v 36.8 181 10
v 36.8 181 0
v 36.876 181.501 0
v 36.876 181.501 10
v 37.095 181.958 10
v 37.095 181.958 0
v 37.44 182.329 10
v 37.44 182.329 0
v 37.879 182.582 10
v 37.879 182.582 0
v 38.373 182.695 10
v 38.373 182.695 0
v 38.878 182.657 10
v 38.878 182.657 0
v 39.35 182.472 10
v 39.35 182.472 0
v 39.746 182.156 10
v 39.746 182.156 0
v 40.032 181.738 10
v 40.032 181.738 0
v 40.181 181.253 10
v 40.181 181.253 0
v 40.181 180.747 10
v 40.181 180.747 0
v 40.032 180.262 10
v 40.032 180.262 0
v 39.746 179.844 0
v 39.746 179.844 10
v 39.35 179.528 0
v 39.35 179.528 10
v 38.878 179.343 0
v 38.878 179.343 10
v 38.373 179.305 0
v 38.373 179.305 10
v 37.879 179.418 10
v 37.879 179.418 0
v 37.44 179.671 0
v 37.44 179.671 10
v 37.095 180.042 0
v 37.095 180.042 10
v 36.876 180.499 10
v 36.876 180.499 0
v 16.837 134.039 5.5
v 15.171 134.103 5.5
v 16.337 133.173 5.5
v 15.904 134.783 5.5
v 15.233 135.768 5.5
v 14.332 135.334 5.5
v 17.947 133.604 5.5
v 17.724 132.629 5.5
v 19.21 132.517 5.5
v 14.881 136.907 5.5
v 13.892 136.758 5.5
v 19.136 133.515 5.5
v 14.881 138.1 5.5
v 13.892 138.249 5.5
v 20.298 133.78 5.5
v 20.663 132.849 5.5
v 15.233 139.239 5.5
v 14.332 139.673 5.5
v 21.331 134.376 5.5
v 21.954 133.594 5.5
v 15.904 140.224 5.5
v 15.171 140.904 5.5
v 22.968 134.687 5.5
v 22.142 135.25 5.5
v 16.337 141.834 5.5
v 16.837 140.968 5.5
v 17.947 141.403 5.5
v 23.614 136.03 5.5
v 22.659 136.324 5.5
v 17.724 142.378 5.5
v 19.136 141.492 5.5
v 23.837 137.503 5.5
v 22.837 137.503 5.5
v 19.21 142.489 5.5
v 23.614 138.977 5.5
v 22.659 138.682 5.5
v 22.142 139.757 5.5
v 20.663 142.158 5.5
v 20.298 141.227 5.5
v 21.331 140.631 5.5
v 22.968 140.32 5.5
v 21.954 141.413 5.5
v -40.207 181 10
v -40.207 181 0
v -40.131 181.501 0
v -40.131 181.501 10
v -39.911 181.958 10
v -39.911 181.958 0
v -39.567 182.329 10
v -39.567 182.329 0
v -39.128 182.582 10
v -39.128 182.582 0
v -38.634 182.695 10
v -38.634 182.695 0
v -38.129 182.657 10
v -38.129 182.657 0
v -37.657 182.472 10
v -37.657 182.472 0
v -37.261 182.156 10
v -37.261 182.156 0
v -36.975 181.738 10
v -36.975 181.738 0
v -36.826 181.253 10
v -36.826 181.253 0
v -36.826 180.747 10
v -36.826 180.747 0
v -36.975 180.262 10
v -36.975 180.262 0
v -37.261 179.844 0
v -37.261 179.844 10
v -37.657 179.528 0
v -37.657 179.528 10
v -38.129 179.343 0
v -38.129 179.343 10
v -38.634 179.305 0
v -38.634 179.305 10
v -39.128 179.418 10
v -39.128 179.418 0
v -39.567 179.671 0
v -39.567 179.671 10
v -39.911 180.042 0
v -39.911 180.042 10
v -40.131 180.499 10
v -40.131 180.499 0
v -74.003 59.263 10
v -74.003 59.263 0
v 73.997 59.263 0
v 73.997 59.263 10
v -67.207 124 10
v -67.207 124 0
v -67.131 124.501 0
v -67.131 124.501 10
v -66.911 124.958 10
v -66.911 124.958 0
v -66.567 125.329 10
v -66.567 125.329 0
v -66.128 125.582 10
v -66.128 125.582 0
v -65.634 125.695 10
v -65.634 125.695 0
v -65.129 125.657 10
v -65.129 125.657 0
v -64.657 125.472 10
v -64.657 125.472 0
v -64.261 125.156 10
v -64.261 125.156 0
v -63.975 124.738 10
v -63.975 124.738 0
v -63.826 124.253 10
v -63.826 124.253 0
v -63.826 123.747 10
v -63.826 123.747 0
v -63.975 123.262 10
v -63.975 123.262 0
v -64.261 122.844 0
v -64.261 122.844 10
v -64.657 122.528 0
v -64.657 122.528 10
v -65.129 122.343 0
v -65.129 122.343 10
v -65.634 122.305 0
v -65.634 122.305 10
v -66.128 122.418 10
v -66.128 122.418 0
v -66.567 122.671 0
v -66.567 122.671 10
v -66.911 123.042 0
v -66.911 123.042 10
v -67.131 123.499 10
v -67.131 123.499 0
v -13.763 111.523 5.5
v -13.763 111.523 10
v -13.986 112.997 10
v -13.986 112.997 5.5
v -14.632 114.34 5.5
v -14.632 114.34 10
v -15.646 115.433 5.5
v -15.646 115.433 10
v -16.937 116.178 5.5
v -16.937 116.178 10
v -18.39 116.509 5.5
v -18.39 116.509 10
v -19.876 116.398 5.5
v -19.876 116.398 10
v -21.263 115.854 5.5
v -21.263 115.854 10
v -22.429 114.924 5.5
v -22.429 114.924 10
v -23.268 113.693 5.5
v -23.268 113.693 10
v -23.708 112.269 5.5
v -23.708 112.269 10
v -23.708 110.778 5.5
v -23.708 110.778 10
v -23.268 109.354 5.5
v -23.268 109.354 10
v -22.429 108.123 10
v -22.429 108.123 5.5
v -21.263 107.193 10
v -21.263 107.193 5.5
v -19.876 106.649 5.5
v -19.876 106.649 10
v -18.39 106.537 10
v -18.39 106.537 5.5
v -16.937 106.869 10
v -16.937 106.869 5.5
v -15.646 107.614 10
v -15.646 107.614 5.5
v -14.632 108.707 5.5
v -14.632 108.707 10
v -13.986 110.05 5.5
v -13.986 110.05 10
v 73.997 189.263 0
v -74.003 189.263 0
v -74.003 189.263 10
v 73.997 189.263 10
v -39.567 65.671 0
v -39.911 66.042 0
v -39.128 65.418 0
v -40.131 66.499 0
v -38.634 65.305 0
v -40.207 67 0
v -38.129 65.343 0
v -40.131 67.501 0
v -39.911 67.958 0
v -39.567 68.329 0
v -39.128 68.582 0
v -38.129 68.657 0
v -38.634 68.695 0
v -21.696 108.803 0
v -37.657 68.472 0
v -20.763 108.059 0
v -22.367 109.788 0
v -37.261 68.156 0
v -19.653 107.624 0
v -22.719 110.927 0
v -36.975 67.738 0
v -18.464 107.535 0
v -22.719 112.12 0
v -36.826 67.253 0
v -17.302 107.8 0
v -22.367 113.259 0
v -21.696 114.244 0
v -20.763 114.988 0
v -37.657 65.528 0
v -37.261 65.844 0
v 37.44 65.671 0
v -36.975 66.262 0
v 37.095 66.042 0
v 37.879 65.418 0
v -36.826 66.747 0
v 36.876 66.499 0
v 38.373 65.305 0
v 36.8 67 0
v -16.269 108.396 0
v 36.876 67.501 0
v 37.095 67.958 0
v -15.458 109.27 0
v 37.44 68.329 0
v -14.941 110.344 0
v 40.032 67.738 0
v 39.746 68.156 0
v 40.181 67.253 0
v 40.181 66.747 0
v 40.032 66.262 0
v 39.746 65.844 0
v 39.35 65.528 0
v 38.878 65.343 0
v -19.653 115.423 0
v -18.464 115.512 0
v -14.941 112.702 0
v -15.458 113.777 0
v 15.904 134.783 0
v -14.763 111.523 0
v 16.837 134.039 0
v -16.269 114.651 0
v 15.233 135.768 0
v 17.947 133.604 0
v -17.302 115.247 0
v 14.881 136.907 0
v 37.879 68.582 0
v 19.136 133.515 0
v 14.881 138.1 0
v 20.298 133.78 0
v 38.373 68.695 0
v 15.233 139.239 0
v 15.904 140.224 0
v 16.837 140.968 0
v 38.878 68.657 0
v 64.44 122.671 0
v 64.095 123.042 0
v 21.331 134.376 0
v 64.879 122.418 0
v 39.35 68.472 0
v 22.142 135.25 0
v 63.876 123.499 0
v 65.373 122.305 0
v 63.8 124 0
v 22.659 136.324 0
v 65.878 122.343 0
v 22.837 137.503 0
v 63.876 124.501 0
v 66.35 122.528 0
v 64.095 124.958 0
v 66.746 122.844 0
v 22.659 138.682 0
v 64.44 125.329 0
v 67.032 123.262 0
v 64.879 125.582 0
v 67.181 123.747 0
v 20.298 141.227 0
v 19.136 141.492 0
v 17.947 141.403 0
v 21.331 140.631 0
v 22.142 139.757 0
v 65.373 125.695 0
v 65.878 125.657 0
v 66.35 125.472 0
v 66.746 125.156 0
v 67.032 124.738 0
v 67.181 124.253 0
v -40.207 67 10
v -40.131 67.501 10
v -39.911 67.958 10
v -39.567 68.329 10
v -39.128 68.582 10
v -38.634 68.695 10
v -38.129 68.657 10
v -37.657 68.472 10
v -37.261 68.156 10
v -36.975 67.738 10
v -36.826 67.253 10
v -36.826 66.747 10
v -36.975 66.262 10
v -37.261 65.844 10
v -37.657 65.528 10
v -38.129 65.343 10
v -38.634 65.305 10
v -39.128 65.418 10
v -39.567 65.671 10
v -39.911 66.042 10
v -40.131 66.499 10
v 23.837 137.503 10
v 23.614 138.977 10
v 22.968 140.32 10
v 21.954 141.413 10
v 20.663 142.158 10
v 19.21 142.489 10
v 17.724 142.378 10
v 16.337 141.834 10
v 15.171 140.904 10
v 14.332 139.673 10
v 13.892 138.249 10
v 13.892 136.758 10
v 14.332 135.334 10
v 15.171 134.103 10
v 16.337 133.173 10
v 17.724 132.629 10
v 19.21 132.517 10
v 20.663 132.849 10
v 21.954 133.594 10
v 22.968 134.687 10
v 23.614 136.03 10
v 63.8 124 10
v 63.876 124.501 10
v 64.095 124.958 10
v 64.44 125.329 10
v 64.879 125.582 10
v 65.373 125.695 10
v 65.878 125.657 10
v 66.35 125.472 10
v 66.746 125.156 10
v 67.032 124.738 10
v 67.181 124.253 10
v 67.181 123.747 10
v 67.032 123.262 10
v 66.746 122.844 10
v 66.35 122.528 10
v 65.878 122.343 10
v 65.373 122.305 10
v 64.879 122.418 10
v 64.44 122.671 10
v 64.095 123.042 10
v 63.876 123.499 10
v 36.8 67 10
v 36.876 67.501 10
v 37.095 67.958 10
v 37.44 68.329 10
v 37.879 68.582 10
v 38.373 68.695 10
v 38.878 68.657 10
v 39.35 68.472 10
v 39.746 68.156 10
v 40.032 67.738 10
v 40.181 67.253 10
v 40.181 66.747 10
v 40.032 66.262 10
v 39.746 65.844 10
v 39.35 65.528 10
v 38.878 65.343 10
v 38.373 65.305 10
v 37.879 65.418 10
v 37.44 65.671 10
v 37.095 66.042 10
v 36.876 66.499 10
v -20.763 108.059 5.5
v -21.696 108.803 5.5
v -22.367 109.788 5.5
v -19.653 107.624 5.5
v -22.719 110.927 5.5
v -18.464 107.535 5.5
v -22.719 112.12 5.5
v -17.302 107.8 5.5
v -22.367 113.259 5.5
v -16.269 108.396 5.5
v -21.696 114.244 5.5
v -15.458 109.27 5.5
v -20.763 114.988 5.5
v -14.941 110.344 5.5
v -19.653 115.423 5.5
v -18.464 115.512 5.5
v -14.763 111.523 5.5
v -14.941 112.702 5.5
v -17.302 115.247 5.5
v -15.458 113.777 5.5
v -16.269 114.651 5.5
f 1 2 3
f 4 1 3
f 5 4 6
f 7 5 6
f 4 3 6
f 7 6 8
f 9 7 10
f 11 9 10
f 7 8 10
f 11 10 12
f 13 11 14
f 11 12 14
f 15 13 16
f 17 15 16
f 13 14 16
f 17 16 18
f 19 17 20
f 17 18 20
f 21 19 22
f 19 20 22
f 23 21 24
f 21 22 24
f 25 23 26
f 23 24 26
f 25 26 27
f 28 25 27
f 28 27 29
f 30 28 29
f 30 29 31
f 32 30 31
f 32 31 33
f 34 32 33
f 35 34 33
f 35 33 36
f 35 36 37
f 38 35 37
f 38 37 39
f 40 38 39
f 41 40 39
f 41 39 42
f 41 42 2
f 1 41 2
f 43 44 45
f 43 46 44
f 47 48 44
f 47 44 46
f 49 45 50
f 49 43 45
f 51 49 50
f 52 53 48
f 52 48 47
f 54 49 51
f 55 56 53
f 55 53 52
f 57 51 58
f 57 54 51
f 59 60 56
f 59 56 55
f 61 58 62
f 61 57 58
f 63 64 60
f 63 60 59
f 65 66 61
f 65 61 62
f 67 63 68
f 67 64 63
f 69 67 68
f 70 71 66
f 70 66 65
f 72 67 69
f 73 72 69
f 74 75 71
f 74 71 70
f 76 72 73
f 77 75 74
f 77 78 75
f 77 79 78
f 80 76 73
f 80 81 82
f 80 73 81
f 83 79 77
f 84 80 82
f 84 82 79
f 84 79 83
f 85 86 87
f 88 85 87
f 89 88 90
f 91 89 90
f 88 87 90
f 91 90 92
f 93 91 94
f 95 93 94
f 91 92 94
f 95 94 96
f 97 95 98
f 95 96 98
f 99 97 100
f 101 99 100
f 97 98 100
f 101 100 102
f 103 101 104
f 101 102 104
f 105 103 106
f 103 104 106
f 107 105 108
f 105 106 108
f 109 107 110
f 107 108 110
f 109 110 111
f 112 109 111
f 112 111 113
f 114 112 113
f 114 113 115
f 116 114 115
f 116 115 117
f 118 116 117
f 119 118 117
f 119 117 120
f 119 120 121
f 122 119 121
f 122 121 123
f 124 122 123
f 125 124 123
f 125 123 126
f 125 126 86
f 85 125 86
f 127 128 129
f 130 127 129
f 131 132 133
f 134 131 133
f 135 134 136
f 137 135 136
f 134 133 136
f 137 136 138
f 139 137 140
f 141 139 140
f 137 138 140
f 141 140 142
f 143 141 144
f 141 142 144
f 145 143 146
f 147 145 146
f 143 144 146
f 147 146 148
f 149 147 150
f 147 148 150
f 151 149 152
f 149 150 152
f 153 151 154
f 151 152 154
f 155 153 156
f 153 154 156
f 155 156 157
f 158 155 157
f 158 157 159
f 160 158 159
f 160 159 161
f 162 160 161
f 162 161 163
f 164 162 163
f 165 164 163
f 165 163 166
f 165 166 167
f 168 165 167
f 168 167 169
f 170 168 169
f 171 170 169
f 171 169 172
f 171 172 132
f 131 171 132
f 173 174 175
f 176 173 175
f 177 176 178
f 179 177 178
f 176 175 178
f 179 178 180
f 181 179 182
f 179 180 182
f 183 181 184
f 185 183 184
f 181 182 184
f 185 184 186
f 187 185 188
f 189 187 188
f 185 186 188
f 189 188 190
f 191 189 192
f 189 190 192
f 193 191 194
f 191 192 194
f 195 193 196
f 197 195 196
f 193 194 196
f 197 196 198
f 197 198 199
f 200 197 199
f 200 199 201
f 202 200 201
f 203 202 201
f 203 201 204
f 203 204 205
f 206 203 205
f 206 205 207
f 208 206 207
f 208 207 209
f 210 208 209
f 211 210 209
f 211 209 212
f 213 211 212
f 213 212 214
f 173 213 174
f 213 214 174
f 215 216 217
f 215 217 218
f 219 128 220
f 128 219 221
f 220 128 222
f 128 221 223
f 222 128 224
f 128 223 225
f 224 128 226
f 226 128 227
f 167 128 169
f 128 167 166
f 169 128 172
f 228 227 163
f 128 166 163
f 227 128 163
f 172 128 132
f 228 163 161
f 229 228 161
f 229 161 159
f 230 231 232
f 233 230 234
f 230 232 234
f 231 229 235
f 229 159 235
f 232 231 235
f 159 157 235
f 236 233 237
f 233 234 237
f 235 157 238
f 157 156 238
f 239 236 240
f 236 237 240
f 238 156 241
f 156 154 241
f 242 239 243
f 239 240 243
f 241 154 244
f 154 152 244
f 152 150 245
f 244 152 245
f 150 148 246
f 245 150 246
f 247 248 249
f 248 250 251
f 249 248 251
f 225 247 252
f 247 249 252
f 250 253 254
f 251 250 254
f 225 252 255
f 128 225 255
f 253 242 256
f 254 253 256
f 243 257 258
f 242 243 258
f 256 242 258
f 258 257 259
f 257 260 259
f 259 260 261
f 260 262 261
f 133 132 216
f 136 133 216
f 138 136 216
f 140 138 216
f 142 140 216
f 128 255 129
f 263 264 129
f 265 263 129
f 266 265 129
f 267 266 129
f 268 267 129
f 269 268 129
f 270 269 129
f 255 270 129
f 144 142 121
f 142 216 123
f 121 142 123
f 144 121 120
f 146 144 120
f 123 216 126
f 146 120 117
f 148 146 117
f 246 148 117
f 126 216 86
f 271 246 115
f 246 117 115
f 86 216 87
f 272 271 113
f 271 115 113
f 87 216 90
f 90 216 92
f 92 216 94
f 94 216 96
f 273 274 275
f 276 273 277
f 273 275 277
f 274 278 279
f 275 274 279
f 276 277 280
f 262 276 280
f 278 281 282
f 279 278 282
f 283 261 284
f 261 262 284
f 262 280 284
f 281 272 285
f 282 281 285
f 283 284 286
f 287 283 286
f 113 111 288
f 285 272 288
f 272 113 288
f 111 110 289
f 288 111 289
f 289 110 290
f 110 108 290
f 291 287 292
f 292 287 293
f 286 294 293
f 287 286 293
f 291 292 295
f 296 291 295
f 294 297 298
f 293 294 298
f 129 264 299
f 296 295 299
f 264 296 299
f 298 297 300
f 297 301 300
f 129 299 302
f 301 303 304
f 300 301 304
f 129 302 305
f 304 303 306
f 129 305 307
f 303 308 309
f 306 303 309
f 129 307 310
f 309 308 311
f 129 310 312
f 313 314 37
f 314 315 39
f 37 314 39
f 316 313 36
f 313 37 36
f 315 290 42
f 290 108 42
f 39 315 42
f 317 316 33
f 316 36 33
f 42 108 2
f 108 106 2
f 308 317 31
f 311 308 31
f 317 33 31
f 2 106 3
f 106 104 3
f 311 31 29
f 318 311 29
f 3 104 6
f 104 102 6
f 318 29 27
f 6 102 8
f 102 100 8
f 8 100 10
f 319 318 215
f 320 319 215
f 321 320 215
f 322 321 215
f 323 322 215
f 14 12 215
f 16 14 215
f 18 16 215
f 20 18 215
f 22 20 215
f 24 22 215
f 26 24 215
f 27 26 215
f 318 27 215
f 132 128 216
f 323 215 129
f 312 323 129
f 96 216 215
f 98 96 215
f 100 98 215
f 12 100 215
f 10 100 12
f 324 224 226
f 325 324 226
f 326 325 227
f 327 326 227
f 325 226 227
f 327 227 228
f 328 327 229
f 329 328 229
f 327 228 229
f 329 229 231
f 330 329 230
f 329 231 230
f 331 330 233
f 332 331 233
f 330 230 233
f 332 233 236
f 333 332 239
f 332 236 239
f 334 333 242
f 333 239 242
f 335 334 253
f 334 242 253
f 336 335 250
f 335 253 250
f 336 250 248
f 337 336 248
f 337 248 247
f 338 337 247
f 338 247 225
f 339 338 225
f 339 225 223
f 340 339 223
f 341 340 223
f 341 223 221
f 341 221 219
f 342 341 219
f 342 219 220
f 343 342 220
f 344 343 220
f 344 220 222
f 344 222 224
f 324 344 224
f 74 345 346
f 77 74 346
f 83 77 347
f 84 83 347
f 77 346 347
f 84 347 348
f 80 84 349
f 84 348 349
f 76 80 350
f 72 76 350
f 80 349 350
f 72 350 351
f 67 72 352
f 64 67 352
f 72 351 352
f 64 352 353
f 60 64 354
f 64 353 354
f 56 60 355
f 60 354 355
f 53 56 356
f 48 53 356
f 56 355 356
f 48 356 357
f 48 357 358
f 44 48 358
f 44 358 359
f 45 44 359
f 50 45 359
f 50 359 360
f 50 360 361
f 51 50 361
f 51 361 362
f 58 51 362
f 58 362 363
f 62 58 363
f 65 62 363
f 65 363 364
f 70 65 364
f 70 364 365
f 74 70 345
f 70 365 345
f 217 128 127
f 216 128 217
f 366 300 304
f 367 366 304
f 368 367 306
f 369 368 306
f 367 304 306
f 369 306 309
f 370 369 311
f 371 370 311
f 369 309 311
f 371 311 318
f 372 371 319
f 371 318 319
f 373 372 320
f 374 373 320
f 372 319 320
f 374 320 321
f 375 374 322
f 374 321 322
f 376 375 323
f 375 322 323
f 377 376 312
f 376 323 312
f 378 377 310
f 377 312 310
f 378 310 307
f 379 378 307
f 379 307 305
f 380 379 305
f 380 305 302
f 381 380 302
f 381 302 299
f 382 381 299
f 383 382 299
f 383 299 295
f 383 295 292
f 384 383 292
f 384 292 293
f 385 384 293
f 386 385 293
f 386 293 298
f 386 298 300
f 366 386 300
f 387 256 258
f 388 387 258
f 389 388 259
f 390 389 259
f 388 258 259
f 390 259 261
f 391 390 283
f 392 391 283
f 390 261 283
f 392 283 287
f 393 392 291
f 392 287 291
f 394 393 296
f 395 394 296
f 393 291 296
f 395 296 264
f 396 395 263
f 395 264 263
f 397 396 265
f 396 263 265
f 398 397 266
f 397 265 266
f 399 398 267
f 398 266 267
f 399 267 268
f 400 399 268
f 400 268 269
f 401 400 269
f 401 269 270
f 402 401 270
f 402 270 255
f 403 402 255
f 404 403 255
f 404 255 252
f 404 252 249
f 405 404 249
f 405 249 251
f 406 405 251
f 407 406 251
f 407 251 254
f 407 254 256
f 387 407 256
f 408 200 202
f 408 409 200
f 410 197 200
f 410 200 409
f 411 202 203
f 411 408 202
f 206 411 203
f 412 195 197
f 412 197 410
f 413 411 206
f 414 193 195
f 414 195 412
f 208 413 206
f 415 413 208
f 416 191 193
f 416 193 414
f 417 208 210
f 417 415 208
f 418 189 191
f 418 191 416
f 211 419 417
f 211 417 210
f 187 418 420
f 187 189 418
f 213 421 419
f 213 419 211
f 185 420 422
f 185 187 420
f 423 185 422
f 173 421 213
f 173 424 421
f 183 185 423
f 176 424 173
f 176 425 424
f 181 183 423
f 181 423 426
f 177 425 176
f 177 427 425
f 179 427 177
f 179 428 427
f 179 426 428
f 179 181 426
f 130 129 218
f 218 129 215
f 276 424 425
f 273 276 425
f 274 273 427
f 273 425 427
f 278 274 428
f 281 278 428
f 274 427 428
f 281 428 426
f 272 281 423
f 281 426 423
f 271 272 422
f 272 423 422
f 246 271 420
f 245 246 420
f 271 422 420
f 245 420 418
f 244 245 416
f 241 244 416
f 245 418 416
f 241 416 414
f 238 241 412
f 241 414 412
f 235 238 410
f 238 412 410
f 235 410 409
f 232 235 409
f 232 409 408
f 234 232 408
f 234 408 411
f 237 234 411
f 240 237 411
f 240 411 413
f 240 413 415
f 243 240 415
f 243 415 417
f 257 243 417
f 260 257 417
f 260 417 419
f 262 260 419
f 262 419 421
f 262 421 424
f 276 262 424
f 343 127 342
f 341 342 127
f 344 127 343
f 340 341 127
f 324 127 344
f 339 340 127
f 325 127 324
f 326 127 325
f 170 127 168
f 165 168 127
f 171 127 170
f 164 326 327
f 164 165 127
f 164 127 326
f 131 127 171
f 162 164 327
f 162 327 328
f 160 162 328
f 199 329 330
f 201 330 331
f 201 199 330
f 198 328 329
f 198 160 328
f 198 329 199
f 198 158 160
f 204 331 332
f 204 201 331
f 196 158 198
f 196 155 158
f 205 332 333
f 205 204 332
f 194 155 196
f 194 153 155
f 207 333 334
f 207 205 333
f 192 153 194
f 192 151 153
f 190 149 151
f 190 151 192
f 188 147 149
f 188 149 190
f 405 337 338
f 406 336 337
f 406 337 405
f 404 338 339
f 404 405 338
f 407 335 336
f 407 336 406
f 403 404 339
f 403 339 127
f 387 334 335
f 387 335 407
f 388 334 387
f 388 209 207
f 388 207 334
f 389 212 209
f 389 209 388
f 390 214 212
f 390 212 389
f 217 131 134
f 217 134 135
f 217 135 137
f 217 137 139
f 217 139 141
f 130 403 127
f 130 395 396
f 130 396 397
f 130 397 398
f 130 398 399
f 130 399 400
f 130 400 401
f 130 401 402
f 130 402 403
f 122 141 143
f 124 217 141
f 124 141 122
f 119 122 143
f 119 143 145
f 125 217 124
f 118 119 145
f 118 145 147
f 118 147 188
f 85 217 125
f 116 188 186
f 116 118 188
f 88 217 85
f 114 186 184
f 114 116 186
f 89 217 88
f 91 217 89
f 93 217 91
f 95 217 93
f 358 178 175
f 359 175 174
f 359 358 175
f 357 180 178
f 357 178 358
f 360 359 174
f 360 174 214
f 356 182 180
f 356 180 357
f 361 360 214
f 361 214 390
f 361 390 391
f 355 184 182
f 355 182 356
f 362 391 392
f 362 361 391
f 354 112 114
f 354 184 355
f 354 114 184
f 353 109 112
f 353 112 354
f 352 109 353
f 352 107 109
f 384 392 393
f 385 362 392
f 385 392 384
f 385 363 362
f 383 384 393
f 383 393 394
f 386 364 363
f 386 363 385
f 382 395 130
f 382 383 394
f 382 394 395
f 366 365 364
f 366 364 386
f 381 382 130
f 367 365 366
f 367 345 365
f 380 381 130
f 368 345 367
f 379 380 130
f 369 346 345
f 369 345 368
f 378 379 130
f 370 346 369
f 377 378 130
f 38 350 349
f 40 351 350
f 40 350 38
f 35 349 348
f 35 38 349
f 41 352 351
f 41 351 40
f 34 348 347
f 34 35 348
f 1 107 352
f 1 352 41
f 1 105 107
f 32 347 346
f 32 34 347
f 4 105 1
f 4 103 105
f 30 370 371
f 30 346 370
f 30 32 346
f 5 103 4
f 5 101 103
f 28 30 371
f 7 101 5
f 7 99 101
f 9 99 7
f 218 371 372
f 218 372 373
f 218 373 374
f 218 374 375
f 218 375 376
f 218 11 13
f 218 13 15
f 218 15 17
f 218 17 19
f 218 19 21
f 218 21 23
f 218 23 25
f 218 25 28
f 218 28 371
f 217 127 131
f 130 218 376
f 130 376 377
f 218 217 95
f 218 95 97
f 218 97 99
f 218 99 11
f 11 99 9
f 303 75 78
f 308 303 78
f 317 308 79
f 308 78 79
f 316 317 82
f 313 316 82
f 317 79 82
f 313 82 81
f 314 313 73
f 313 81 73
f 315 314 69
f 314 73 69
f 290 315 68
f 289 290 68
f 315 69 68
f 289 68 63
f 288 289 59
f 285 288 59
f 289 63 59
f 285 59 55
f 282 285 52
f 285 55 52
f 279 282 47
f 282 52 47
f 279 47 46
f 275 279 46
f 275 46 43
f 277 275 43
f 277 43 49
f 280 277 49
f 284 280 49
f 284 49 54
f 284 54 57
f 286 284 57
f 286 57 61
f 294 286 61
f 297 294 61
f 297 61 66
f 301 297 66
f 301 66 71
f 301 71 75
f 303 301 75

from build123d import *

# Parameters (mm, degrees)
ESBO_O1_W                  = 148
ESBO_O1_H                  = 130
RESSALTO_EXTRUS_O1_DEPTH   = 10
FURO_COM_FOLGA_DE_M3X0_5_D = 3.4
ESBO_O5_R                  = 5
CORTE_EXTRUS_O1_DEPTH      = 4.5
CORTE_EXTRUS_O2_REACH      = 205.463
ESBO_O6_R                  = 4


with BuildPart() as part:
    # Esboço1 → Ressalto-extrusão1 (new body)
    with BuildSketch(Plane.XY):
        with Locations((-0.0034, 124.2634)):
            Rectangle(ESBO_O1_W, ESBO_O1_H)
    extrude(amount=RESSALTO_EXTRUS_O1_DEPTH)

    # Furo com folga de M3X0.5 (through all)
    with Locations(Plane.XY.offset(10)):
        with Locations((38.5, 67), (-38.5068, 67), (65.5, 124), (-65.5068, 124), (-38.5068, 181), (38.5, 181)):
            Hole(FURO_COM_FOLGA_DE_M3X0_5_D / 2)

    # Esboço5 → Corte-extrusão1 (cut)
    with BuildSketch(Plane.XY.offset(10)):
        with Locations((-18.7634, 111.5234)):
            Circle(ESBO_O5_R)
        with Locations((18.8366, 137.5034)):
            Circle(ESBO_O5_R)
    extrude(amount=-CORTE_EXTRUS_O1_DEPTH, mode=Mode.SUBTRACT)

    # Esboço6 → Corte-extrusão2 (cut, up to next)
    with BuildSketch(Plane.XY.offset(10), mode=Mode.PRIVATE) as corte_extrus_o2_sk1:
        with Locations((-18.7634, 111.5234)):
            Circle(ESBO_O6_R)
    corte_extrus_o2_tool1 = extrude(corte_extrus_o2_sk1.sketch, amount=-CORTE_EXTRUS_O2_REACH, mode=Mode.PRIVATE) & part.part
    # Esboço6 → Corte-extrusão2 (cut, up to next)
    with BuildSketch(Plane.XY.offset(10), mode=Mode.PRIVATE) as corte_extrus_o2_sk2:
        with Locations((18.8366, 137.5034)):
            Circle(ESBO_O6_R)
    corte_extrus_o2_tool2 = extrude(corte_extrus_o2_sk2.sketch, amount=-CORTE_EXTRUS_O2_REACH, mode=Mode.PRIVATE) & part.part
    add(corte_extrus_o2_tool1.solids().sort_by_distance((-18.7634, 111.5234, 10))[0], mode=Mode.SUBTRACT)
    add(corte_extrus_o2_tool2.solids().sort_by_distance((18.8366, 137.5034, 10))[0], mode=Mode.SUBTRACT)


solid = part.part
